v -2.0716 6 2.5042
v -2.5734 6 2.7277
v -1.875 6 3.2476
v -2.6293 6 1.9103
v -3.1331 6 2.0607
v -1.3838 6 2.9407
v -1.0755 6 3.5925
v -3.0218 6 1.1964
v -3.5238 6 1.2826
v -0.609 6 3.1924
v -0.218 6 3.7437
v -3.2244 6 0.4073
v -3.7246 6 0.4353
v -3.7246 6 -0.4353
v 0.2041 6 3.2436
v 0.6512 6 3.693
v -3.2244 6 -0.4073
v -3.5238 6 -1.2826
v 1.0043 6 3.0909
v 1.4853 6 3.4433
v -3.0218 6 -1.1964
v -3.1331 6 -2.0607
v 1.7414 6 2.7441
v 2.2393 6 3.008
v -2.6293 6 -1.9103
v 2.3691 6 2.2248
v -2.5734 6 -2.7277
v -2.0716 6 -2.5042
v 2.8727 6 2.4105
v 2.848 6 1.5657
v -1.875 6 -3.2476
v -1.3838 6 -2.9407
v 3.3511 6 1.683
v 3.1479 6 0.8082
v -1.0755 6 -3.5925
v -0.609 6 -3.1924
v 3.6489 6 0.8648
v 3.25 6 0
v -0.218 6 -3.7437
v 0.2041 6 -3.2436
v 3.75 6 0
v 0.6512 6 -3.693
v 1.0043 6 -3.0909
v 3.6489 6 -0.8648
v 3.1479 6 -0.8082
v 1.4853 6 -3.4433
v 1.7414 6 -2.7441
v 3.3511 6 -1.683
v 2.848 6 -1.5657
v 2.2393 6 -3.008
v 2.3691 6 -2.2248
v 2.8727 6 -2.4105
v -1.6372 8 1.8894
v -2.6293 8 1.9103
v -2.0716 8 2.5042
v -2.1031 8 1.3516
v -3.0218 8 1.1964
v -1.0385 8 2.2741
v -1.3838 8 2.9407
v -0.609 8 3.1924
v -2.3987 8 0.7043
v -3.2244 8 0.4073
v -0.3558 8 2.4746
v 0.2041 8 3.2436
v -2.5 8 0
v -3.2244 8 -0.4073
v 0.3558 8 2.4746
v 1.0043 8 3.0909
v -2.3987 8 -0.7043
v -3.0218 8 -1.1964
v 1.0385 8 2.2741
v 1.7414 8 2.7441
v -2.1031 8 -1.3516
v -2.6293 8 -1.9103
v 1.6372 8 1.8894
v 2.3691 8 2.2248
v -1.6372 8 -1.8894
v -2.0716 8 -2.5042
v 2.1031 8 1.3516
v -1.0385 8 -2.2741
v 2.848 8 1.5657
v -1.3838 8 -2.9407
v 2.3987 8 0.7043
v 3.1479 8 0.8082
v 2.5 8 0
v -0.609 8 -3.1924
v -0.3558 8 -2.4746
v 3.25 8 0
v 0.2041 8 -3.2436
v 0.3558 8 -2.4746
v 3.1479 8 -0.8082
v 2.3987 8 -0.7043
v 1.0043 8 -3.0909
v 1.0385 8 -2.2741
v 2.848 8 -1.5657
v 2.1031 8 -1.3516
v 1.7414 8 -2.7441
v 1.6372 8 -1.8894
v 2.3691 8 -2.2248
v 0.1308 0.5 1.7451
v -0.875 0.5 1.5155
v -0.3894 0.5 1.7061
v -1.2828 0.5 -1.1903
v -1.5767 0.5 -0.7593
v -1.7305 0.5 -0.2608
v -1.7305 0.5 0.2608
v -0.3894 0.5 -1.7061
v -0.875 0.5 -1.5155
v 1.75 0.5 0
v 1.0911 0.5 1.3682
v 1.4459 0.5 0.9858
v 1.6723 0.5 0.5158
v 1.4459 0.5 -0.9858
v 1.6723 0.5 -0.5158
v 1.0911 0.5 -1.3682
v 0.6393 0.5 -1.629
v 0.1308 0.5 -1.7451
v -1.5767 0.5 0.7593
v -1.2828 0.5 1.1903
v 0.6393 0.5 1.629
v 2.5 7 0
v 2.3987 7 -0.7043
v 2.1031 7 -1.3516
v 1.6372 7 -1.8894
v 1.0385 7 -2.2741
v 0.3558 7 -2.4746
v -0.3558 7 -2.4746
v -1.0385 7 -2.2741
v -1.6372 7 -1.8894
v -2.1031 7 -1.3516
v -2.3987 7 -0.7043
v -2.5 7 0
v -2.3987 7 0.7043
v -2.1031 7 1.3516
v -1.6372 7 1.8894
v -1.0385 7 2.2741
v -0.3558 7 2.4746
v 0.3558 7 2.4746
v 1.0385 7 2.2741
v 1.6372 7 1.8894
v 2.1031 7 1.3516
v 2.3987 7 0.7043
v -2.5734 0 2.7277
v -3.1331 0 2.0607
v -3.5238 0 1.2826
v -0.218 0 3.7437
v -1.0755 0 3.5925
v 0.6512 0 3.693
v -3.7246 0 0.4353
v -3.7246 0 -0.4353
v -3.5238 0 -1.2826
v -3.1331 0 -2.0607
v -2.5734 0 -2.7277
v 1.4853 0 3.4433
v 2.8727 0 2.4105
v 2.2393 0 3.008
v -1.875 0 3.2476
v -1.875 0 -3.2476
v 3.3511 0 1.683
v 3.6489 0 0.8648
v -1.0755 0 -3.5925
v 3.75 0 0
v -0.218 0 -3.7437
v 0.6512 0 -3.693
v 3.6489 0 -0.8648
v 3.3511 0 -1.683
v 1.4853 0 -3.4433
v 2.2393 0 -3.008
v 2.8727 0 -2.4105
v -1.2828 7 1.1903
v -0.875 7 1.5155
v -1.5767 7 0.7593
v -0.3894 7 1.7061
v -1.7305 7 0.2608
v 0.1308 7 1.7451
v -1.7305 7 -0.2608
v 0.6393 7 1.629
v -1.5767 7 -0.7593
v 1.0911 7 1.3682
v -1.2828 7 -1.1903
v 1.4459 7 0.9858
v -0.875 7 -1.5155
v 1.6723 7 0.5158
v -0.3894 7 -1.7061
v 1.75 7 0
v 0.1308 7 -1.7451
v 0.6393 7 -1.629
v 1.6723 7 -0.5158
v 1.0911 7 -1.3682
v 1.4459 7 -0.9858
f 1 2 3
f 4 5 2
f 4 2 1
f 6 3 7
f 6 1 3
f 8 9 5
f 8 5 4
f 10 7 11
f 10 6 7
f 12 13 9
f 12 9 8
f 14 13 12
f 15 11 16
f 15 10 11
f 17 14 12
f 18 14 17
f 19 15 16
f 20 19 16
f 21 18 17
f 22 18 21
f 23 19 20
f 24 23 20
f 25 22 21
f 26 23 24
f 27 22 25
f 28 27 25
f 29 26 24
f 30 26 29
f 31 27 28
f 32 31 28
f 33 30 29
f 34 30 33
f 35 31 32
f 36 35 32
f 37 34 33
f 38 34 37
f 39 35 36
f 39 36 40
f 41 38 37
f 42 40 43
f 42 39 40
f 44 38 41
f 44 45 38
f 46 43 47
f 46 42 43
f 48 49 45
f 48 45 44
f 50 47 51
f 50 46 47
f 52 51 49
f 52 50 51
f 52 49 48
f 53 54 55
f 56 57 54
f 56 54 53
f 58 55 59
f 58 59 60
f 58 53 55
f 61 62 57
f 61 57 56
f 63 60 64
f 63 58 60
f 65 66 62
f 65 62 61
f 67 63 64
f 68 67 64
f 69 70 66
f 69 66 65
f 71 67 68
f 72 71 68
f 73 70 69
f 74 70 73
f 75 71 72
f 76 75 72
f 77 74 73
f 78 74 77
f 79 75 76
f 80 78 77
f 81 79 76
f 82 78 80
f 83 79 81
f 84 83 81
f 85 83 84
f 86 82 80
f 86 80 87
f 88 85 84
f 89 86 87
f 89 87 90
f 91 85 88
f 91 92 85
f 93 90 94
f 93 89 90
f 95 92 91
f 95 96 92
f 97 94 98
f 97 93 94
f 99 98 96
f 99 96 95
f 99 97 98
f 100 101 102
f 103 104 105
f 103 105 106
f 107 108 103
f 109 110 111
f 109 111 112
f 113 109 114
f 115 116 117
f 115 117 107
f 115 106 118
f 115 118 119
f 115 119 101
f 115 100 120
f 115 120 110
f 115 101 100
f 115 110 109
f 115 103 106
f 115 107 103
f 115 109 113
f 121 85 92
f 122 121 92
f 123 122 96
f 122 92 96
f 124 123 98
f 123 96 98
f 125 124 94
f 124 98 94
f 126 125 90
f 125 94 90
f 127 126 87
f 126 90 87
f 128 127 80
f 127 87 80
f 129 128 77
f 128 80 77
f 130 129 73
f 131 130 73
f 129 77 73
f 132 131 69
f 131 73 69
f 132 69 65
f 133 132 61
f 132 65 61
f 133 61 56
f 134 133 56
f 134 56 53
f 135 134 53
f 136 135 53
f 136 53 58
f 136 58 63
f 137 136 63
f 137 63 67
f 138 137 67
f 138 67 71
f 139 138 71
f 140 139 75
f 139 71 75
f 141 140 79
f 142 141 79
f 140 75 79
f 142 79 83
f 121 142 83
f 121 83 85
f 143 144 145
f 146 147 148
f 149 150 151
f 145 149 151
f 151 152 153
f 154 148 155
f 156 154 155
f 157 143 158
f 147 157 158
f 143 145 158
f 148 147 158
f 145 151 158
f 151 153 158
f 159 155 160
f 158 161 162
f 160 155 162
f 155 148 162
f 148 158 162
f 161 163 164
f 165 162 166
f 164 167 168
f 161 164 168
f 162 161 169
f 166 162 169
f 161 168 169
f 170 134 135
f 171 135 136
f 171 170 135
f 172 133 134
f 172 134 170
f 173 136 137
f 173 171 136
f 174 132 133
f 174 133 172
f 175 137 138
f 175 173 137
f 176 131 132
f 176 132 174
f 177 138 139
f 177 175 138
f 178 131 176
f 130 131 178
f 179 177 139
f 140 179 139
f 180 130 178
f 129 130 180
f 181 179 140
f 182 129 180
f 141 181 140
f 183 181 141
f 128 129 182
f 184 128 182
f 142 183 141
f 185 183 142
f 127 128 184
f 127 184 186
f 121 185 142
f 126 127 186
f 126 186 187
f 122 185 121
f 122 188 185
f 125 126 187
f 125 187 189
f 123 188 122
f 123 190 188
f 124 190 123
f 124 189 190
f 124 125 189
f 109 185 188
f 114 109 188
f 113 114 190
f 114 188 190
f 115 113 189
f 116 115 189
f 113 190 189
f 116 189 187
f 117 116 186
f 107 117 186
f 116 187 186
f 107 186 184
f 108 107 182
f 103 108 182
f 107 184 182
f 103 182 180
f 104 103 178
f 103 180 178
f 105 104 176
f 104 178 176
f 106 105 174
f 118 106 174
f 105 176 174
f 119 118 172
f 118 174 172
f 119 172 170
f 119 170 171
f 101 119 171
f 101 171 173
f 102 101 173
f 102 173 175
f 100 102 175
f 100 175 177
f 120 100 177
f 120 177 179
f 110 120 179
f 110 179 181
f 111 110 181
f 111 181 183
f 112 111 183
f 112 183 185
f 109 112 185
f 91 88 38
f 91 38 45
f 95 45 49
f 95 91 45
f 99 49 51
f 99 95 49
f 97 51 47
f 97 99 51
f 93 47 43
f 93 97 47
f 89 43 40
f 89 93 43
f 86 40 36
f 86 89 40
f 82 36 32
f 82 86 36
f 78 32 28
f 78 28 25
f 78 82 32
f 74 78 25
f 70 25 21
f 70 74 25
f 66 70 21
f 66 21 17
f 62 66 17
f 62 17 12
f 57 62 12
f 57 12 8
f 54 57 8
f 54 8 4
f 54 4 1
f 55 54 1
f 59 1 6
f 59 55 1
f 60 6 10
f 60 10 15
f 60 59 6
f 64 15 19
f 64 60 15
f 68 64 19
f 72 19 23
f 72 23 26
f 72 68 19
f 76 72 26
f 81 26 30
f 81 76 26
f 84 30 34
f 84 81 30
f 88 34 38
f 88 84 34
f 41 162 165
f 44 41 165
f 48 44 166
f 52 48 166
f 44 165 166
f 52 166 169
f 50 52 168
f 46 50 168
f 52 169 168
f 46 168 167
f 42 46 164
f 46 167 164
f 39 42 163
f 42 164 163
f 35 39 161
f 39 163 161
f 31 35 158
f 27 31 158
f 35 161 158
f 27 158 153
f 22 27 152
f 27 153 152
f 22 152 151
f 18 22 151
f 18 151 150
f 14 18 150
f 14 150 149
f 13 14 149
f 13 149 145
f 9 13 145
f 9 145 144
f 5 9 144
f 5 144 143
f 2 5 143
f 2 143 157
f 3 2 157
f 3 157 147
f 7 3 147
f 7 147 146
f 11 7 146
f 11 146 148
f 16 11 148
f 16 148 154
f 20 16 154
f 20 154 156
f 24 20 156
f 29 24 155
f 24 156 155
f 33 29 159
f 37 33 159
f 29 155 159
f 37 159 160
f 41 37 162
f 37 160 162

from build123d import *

# Parameters (mm, degrees)
SKETCH1_R           = 3.75
BOSS_EXTRUDE1_DEPTH = 8
SKETCH3_R           = 3.75
SKETCH3_R_2         = 3.25
CUT_EXTRUDE1_DEPTH  = 2
SKETCH4_R           = 1.75
CUT_EXTRUDE2_DEPTH  = 7.5
SKETCH5_R           = 2.5
CUT_EXTRUDE3_DEPTH  = 1


with BuildPart() as part:
    # Sketch1 → Boss-Extrude1 (new body)
    with BuildSketch(Plane(origin=(0, 0, 0), x_dir=(1, 0, 0), z_dir=(0, 1, 0))):
        Circle(SKETCH1_R)
    extrude(amount=BOSS_EXTRUDE1_DEPTH)

    # Sketch3 → Cut-Extrude1 (cut)
    with BuildSketch(Plane(origin=(0, 8, 0), x_dir=(1, 0, 0), z_dir=(0, 1, 0))):
        Circle(SKETCH3_R)
        Circle(SKETCH3_R_2, mode=Mode.SUBTRACT)
    extrude(amount=-CUT_EXTRUDE1_DEPTH, mode=Mode.SUBTRACT)

    # Sketch4 → Cut-Extrude2 (cut)
    with BuildSketch(Plane(origin=(0, 8, 0), x_dir=(1, 0, 0), z_dir=(0, 1, 0))):
        Circle(SKETCH4_R)
    extrude(amount=-CUT_EXTRUDE2_DEPTH, mode=Mode.SUBTRACT)

    # Sketch5 → Cut-Extrude3 (cut)
    with BuildSketch(Plane(origin=(0, 8, 0), x_dir=(1, 0, 0), z_dir=(0, 1, 0))):
        Circle(SKETCH5_R)
    extrude(amount=-CUT_EXTRUDE3_DEPTH, mode=Mode.SUBTRACT)


solid = part.part
